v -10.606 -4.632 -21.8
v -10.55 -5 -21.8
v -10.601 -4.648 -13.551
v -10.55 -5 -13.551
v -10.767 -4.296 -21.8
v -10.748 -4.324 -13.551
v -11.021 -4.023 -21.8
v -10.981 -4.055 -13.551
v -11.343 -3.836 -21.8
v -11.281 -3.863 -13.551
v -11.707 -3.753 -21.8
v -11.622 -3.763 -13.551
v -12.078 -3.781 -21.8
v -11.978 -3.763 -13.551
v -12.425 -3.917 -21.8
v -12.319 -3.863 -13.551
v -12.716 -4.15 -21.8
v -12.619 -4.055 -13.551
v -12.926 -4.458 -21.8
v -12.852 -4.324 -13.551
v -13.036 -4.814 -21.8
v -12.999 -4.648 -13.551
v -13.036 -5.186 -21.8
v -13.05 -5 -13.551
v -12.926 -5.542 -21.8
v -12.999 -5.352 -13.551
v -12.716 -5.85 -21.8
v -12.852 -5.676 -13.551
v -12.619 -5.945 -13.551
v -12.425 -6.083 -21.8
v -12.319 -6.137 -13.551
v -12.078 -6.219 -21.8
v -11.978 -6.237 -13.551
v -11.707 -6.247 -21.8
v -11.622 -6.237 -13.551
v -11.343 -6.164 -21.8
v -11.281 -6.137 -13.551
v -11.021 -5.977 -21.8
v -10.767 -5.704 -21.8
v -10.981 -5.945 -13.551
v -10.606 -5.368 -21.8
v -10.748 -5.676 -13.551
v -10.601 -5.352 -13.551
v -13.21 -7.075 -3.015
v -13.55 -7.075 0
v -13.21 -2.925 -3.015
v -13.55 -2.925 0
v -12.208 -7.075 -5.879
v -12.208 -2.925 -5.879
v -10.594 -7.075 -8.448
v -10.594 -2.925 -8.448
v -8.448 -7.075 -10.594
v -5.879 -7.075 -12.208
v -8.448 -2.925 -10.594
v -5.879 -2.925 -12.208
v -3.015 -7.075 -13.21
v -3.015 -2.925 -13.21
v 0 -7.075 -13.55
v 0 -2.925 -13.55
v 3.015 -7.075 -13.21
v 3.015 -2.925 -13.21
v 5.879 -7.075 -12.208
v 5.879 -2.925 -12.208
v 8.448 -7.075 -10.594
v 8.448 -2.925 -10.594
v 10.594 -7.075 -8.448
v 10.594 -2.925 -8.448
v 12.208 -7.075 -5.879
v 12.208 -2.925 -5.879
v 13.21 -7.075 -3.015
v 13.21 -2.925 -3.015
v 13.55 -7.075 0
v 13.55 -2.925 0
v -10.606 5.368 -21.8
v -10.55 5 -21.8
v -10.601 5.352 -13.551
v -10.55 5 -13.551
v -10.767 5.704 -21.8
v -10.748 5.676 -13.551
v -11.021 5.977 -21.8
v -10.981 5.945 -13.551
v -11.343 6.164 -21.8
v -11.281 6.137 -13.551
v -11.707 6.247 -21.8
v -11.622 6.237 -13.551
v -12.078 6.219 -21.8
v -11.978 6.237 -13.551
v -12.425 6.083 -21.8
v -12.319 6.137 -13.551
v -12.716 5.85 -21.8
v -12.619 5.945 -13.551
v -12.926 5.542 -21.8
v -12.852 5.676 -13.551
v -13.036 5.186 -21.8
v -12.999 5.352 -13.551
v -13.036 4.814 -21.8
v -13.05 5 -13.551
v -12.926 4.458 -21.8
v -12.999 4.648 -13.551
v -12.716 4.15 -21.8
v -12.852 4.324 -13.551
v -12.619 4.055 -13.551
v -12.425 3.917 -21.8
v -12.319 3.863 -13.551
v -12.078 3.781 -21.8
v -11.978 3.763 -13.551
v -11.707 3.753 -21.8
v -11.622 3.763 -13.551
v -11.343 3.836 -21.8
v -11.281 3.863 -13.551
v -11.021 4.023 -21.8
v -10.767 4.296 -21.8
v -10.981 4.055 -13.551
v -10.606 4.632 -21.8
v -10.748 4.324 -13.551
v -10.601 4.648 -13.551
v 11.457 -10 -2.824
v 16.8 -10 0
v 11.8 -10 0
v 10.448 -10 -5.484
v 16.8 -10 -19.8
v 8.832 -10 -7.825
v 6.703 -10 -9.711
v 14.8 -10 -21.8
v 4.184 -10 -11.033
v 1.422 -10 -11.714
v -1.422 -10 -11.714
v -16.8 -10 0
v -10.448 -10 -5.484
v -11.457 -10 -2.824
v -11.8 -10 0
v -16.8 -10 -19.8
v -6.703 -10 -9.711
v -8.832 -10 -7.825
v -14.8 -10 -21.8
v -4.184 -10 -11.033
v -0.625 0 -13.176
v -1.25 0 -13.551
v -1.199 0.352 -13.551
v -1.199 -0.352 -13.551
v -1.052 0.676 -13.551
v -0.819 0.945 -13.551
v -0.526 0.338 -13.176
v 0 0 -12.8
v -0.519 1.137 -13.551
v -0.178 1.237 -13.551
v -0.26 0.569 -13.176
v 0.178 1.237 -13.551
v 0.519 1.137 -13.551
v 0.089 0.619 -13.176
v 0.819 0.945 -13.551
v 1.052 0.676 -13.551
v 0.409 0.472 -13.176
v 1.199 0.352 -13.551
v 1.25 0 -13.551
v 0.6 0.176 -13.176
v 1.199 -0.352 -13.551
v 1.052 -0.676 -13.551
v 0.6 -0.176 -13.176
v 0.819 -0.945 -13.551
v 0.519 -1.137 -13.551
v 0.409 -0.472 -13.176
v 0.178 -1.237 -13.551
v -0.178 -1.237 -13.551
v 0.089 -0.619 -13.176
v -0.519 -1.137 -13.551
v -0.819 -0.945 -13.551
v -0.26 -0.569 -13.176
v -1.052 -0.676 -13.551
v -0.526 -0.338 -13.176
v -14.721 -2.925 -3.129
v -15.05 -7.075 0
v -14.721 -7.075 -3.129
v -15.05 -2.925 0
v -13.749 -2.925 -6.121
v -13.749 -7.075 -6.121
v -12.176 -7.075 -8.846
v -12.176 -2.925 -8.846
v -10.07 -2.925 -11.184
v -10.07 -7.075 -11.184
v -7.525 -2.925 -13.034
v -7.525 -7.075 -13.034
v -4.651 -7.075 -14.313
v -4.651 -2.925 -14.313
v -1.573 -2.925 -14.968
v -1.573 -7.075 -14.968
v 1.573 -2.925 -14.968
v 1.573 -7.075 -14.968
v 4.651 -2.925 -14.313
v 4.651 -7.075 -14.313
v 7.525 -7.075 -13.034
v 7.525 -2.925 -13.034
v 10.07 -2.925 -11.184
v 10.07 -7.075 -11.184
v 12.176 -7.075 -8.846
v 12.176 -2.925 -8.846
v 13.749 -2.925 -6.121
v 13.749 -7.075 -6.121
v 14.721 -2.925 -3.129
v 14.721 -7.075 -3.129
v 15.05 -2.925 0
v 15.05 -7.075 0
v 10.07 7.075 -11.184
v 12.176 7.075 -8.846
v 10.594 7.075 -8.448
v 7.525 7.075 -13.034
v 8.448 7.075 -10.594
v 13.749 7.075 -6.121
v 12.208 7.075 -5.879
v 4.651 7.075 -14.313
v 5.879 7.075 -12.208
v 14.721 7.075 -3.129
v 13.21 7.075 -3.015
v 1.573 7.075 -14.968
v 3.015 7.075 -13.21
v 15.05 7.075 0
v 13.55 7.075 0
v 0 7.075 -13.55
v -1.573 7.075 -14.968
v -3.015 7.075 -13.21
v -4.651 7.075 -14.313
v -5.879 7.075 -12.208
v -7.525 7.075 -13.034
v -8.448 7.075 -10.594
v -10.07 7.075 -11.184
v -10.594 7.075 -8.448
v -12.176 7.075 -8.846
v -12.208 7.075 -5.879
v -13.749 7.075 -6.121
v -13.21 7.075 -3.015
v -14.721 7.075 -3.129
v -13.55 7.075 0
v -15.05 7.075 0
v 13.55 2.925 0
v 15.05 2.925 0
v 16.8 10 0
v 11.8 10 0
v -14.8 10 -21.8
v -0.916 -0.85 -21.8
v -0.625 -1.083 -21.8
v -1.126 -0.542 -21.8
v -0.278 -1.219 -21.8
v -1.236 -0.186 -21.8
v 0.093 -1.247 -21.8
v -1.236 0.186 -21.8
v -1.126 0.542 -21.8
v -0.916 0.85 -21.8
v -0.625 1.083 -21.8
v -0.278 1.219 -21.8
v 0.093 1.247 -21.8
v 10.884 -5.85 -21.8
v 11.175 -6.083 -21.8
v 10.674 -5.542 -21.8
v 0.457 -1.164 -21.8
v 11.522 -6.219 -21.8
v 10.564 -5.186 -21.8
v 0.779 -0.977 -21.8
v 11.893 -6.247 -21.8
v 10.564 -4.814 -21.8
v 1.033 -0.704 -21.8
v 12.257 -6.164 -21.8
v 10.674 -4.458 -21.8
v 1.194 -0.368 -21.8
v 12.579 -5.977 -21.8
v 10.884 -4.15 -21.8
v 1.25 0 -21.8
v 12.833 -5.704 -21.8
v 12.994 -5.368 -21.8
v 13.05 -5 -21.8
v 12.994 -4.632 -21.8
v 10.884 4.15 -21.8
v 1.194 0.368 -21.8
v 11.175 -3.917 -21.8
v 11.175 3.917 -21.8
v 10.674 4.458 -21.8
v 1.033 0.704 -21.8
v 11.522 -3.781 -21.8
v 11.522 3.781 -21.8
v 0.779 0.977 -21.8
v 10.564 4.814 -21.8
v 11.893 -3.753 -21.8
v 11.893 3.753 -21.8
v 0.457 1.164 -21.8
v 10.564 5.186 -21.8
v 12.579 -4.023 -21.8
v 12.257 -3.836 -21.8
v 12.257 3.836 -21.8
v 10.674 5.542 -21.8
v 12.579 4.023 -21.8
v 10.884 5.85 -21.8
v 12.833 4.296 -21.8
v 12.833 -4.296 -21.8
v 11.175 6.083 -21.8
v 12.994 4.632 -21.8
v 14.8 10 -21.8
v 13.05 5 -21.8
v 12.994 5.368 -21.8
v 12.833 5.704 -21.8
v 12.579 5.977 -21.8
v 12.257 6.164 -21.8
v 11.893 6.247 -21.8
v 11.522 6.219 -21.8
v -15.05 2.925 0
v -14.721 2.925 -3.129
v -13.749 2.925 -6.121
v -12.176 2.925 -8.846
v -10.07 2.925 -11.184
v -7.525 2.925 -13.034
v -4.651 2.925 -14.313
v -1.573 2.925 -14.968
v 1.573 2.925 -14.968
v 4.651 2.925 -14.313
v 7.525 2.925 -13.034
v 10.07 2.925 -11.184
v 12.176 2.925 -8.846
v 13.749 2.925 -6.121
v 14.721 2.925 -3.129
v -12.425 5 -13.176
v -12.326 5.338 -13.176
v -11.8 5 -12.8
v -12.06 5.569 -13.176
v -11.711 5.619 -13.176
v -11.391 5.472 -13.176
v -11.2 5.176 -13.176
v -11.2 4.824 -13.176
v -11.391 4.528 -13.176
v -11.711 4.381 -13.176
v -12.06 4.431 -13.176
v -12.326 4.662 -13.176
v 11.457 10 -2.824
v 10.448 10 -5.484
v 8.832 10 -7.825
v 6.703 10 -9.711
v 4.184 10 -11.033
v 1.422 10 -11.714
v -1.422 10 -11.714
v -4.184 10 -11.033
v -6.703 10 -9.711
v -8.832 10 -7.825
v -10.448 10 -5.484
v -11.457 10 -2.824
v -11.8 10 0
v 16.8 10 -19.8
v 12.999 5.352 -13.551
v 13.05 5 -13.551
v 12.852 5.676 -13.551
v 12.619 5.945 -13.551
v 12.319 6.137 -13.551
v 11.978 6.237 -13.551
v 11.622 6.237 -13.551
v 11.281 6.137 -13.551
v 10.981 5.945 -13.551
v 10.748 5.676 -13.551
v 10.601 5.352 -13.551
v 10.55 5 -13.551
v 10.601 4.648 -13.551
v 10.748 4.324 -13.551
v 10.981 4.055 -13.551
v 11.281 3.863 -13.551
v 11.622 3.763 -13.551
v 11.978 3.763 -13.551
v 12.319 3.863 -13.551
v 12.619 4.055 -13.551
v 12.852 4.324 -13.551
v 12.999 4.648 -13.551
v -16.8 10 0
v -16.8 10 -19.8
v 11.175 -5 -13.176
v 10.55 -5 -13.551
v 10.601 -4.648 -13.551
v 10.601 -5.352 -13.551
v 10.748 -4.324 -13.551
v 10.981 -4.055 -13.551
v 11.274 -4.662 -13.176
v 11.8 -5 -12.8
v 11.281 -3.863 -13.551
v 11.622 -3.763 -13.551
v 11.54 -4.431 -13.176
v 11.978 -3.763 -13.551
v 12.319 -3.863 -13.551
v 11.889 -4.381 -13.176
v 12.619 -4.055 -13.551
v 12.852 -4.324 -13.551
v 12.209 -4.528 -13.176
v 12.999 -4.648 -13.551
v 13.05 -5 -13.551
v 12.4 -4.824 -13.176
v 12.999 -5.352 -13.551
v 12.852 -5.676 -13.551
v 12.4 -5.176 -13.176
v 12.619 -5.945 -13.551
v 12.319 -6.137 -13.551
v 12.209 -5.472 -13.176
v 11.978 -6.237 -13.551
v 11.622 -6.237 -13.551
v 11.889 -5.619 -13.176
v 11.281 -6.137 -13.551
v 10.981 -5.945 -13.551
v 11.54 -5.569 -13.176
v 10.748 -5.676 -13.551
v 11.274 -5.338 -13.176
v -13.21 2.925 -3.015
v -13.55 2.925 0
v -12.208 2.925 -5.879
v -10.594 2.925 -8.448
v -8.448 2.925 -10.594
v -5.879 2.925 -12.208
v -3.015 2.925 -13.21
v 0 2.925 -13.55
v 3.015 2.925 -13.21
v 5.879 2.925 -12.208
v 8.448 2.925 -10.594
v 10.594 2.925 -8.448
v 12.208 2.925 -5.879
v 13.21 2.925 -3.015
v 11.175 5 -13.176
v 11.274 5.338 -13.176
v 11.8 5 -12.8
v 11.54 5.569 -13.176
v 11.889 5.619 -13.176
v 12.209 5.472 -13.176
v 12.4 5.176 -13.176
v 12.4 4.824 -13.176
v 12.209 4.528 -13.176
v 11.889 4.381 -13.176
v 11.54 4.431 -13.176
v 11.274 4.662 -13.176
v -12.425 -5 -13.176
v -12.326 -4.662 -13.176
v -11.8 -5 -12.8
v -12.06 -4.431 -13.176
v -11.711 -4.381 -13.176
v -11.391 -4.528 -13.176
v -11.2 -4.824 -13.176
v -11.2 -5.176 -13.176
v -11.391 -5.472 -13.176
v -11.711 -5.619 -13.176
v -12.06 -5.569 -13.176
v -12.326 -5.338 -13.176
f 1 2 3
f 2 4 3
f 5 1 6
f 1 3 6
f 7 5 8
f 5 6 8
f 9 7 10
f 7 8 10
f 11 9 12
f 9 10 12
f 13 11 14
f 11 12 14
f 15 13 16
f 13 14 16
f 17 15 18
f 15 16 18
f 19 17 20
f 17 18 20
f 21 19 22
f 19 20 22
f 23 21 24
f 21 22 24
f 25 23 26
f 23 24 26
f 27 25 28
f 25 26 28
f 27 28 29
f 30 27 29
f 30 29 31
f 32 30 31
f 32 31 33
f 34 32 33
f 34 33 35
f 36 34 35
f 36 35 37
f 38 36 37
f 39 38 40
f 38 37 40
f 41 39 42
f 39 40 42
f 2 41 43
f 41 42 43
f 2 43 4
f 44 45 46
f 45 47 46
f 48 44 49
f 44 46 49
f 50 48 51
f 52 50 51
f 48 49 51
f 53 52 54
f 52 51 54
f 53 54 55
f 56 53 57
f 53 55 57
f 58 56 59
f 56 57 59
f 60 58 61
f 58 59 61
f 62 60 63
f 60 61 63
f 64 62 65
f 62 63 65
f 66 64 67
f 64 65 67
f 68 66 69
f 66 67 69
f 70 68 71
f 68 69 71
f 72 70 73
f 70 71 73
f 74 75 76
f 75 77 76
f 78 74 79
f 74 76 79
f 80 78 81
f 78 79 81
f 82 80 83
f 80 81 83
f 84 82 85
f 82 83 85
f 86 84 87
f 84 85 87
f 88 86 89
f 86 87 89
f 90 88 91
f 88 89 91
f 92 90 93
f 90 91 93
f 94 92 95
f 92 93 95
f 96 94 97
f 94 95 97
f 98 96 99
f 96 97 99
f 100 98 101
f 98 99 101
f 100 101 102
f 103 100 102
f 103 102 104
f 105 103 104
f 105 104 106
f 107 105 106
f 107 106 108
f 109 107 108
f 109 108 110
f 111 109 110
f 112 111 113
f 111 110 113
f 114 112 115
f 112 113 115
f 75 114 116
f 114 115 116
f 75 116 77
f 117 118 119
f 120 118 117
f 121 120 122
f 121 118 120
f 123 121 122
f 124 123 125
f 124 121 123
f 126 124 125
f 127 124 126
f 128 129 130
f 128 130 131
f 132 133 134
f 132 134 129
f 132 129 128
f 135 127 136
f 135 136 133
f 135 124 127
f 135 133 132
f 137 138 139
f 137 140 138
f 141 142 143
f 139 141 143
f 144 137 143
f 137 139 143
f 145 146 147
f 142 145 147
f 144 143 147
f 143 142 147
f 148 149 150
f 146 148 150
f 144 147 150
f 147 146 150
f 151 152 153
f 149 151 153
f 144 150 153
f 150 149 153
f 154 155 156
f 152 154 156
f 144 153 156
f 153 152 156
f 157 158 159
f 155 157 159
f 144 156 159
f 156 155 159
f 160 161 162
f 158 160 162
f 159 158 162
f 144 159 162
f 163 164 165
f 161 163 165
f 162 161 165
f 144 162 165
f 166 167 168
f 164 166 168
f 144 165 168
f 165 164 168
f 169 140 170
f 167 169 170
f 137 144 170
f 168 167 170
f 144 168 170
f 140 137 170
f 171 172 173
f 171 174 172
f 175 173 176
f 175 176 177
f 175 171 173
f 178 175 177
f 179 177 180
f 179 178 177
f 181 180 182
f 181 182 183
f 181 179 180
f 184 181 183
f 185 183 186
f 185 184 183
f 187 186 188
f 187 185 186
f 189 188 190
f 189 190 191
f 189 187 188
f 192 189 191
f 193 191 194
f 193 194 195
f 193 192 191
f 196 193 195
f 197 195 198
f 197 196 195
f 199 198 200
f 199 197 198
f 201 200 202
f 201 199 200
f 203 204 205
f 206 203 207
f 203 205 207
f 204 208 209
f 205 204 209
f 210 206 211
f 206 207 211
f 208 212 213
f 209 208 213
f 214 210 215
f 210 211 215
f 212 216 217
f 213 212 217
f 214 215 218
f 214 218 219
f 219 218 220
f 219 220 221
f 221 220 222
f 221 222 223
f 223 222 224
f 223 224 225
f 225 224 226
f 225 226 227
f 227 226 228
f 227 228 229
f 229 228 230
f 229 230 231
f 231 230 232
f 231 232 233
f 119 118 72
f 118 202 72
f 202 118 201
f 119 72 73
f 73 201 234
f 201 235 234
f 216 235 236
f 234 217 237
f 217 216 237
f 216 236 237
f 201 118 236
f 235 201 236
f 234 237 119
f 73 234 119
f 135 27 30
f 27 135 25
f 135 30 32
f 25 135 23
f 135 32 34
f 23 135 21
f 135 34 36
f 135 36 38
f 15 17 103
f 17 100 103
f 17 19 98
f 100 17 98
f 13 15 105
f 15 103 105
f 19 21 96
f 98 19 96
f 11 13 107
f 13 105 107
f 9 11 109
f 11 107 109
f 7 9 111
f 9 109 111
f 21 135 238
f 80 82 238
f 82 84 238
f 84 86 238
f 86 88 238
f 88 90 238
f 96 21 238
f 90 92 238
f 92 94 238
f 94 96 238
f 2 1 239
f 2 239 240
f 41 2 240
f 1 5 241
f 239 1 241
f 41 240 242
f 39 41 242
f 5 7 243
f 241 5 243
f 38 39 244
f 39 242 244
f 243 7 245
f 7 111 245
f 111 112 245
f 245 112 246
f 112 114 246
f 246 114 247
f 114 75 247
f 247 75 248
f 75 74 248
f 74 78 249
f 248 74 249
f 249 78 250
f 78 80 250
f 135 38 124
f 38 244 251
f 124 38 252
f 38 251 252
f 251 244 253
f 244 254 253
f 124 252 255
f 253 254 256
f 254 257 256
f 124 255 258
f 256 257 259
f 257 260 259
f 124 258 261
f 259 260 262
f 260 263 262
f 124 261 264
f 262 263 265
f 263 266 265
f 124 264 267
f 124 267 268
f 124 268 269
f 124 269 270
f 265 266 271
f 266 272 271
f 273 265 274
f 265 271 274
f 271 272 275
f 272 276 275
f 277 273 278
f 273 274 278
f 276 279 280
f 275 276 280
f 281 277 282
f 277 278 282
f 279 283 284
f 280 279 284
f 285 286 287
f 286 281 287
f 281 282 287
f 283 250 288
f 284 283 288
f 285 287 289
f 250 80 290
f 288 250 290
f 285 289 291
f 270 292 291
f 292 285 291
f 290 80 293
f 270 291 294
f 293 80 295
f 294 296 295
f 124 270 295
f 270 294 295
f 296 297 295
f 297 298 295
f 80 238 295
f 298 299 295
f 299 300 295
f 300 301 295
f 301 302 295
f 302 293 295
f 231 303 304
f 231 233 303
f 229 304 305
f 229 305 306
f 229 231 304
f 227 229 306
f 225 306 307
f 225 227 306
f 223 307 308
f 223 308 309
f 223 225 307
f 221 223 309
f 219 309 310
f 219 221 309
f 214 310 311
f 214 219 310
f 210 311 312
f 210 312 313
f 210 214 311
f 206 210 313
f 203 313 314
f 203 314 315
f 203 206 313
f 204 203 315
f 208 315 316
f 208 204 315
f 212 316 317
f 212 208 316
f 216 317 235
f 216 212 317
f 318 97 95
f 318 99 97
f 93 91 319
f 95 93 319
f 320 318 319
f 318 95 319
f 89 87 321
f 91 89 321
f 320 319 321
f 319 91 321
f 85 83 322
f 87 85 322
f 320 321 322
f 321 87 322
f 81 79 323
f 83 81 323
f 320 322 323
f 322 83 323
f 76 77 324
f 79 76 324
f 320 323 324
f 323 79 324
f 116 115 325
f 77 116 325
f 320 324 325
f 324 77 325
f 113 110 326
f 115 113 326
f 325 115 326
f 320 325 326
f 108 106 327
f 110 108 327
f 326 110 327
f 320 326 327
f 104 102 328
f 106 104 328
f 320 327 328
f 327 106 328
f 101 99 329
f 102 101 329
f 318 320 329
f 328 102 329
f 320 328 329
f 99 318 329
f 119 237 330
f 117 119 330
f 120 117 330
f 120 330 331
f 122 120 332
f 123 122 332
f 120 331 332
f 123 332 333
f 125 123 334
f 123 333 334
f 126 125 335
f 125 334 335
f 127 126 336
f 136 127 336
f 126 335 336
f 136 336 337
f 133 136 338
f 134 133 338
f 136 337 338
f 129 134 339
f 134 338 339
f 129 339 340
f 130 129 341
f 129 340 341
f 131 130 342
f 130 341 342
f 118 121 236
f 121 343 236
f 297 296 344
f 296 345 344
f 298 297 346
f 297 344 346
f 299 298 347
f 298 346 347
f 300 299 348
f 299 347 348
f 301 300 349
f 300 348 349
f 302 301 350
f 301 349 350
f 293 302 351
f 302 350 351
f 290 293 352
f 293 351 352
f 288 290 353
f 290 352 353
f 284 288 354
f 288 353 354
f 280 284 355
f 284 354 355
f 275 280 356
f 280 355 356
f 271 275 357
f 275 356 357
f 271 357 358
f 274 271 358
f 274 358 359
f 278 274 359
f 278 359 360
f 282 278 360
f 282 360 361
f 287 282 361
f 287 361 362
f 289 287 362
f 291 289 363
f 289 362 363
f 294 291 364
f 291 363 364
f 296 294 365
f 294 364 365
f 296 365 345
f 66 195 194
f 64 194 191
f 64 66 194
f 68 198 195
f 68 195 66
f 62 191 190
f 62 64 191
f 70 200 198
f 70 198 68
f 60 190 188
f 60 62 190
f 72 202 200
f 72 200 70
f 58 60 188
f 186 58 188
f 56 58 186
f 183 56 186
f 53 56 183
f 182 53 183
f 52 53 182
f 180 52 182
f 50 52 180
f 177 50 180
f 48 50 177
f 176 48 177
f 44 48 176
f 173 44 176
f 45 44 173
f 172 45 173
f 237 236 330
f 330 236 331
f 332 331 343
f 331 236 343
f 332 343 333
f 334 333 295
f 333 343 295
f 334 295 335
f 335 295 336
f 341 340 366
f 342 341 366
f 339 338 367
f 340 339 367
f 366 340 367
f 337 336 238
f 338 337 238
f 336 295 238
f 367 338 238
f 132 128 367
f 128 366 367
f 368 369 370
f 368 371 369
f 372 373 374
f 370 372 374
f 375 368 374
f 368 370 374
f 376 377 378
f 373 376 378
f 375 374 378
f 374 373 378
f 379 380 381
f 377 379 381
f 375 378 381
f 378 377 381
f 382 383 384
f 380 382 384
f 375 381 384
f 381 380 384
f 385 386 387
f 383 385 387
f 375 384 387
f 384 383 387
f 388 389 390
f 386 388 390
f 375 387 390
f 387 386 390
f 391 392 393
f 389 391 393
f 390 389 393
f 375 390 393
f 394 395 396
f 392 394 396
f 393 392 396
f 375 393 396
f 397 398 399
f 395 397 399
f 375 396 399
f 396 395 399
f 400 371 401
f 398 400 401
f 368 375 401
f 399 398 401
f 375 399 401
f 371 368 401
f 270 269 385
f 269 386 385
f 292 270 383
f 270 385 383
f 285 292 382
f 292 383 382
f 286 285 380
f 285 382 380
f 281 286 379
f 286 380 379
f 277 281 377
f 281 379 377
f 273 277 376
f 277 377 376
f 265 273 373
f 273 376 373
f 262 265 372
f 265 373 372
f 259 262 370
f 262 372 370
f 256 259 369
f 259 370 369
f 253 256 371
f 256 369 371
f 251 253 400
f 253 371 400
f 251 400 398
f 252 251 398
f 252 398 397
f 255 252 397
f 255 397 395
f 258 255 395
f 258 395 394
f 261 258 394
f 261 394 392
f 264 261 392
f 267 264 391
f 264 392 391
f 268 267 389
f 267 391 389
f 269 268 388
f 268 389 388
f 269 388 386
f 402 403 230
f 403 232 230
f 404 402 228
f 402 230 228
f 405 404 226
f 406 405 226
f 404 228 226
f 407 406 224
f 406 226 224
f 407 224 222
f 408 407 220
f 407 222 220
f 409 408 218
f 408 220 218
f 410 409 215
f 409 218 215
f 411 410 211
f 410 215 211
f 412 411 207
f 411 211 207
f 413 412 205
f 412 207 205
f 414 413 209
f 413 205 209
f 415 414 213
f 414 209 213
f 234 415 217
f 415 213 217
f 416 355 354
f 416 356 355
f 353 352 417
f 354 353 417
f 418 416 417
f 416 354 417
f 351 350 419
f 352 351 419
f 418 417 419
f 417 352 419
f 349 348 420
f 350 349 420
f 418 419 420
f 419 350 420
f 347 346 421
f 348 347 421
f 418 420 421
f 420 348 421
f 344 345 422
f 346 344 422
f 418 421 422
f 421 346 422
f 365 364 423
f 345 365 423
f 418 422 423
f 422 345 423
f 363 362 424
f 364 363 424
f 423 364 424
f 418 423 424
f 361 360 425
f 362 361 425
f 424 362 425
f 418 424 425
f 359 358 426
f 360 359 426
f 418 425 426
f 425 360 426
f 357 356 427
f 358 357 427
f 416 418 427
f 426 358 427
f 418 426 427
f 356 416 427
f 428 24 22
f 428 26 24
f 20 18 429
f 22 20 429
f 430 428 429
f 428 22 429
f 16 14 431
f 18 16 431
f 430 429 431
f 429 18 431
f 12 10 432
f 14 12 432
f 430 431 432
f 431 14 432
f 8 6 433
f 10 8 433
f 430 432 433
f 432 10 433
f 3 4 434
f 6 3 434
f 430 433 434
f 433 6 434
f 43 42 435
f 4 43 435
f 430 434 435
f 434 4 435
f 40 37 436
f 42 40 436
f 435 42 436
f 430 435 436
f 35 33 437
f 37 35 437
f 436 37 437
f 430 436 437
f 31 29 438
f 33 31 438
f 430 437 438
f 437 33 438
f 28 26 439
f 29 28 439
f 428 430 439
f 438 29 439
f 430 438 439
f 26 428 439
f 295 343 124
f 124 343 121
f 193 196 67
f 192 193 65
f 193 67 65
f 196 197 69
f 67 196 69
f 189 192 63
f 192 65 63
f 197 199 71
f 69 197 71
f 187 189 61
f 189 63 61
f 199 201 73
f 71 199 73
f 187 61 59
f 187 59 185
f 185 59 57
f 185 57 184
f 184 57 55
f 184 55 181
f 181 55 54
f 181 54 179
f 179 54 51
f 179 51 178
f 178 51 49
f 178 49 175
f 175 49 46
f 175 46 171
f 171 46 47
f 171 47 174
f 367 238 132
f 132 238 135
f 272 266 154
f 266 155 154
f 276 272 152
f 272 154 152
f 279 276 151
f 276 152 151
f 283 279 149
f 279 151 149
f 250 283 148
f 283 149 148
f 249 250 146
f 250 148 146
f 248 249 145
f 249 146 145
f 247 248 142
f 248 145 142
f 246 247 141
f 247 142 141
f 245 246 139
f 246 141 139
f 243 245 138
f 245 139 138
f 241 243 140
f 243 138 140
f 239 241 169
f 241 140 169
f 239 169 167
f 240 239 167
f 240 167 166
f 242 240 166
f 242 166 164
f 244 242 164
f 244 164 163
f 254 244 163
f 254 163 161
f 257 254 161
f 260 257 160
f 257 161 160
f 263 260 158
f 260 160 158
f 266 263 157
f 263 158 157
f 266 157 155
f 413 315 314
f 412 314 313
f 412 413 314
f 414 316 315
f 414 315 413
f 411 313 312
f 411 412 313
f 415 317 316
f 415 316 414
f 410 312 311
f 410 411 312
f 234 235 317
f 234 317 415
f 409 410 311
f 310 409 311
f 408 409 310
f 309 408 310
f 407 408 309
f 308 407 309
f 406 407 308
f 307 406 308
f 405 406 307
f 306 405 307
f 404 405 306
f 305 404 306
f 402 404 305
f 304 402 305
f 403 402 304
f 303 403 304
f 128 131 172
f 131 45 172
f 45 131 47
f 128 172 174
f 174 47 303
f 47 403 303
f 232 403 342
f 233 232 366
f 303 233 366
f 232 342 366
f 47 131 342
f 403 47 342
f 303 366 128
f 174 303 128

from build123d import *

# Parameters (mm, degrees)
BOSS_EXTRUDE1_DEPTH             = 10
SKETCH2_W                       = 1.5
SKETCH2_H                       = 4.15
TAP_DRILL_FOR_M3X0_5_TAP1_D     = 2.5
TAP_DRILL_FOR_M3X0_5_TAP1_DEPTH = 8.248924226
TAP_DRILL_FOR_M3X0_5_TAP1_TIP   = 0.751075774
CHAMFER1_SIZE                   = 2


with BuildPart() as part:
    # Sketch1 → Boss-Extrude1 (new, symmetric)
    with BuildSketch(Plane(origin=(0, 0, 0), x_dir=(1, 0, 0), z_dir=(0, 1, 0))):
        with BuildLine():
            Line((-11.8, 0), (-16.8, 0))
            Line((-16.8, 0), (-16.8, 21.8))
            Line((-16.8, 21.8), (16.8, 21.8))
            Line((16.8, 21.8), (16.8, 0))
            Line((16.8, 0), (11.8, 0))
            ThreePointArc((11.8, 0), (0, 11.8), (-11.8, 0))
        make_face()
    extrude(amount=BOSS_EXTRUDE1_DEPTH, both=True)

    # Sketch2 → Cut-Revolve1 (revolve, cut)
    with BuildSketch(Plane.XY):
        with Locations((14.3, 5)):
            Rectangle(SKETCH2_W, SKETCH2_H)
        with Locations((14.3, -5)):
            Rectangle(SKETCH2_W, SKETCH2_H)
    revolve(axis=Axis((0, 0, 0), (0, -1, 0)), mode=Mode.SUBTRACT)

    # Tap Drill for M3x0.5 Tap1
    with Locations(Plane(origin=(0, 0, -21.8), x_dir=(-1, 0, 0), z_dir=(0, 0, -1))):
        with Locations((0, 0), (11.8, -5), (11.8, 5), (-11.8, 5), (-11.8, -5)):
            Hole(TAP_DRILL_FOR_M3X0_5_TAP1_D / 2, depth=TAP_DRILL_FOR_M3X0_5_TAP1_DEPTH)
            with Locations((0, 0, -(TAP_DRILL_FOR_M3X0_5_TAP1_DEPTH + TAP_DRILL_FOR_M3X0_5_TAP1_TIP / 2))):  # 118° drill point
                Cone(0, TAP_DRILL_FOR_M3X0_5_TAP1_D / 2, TAP_DRILL_FOR_M3X0_5_TAP1_TIP, mode=Mode.SUBTRACT)

    # Chamfer1
    chamfer1_edges = [part.edges().sort_by_distance(p)[0] for p in [
        (-16.8, 0, -21.8),
        (16.8, 0, -21.8),
    ]]
    chamfer(chamfer1_edges, length=CHAMFER1_SIZE)


solid = part.part
